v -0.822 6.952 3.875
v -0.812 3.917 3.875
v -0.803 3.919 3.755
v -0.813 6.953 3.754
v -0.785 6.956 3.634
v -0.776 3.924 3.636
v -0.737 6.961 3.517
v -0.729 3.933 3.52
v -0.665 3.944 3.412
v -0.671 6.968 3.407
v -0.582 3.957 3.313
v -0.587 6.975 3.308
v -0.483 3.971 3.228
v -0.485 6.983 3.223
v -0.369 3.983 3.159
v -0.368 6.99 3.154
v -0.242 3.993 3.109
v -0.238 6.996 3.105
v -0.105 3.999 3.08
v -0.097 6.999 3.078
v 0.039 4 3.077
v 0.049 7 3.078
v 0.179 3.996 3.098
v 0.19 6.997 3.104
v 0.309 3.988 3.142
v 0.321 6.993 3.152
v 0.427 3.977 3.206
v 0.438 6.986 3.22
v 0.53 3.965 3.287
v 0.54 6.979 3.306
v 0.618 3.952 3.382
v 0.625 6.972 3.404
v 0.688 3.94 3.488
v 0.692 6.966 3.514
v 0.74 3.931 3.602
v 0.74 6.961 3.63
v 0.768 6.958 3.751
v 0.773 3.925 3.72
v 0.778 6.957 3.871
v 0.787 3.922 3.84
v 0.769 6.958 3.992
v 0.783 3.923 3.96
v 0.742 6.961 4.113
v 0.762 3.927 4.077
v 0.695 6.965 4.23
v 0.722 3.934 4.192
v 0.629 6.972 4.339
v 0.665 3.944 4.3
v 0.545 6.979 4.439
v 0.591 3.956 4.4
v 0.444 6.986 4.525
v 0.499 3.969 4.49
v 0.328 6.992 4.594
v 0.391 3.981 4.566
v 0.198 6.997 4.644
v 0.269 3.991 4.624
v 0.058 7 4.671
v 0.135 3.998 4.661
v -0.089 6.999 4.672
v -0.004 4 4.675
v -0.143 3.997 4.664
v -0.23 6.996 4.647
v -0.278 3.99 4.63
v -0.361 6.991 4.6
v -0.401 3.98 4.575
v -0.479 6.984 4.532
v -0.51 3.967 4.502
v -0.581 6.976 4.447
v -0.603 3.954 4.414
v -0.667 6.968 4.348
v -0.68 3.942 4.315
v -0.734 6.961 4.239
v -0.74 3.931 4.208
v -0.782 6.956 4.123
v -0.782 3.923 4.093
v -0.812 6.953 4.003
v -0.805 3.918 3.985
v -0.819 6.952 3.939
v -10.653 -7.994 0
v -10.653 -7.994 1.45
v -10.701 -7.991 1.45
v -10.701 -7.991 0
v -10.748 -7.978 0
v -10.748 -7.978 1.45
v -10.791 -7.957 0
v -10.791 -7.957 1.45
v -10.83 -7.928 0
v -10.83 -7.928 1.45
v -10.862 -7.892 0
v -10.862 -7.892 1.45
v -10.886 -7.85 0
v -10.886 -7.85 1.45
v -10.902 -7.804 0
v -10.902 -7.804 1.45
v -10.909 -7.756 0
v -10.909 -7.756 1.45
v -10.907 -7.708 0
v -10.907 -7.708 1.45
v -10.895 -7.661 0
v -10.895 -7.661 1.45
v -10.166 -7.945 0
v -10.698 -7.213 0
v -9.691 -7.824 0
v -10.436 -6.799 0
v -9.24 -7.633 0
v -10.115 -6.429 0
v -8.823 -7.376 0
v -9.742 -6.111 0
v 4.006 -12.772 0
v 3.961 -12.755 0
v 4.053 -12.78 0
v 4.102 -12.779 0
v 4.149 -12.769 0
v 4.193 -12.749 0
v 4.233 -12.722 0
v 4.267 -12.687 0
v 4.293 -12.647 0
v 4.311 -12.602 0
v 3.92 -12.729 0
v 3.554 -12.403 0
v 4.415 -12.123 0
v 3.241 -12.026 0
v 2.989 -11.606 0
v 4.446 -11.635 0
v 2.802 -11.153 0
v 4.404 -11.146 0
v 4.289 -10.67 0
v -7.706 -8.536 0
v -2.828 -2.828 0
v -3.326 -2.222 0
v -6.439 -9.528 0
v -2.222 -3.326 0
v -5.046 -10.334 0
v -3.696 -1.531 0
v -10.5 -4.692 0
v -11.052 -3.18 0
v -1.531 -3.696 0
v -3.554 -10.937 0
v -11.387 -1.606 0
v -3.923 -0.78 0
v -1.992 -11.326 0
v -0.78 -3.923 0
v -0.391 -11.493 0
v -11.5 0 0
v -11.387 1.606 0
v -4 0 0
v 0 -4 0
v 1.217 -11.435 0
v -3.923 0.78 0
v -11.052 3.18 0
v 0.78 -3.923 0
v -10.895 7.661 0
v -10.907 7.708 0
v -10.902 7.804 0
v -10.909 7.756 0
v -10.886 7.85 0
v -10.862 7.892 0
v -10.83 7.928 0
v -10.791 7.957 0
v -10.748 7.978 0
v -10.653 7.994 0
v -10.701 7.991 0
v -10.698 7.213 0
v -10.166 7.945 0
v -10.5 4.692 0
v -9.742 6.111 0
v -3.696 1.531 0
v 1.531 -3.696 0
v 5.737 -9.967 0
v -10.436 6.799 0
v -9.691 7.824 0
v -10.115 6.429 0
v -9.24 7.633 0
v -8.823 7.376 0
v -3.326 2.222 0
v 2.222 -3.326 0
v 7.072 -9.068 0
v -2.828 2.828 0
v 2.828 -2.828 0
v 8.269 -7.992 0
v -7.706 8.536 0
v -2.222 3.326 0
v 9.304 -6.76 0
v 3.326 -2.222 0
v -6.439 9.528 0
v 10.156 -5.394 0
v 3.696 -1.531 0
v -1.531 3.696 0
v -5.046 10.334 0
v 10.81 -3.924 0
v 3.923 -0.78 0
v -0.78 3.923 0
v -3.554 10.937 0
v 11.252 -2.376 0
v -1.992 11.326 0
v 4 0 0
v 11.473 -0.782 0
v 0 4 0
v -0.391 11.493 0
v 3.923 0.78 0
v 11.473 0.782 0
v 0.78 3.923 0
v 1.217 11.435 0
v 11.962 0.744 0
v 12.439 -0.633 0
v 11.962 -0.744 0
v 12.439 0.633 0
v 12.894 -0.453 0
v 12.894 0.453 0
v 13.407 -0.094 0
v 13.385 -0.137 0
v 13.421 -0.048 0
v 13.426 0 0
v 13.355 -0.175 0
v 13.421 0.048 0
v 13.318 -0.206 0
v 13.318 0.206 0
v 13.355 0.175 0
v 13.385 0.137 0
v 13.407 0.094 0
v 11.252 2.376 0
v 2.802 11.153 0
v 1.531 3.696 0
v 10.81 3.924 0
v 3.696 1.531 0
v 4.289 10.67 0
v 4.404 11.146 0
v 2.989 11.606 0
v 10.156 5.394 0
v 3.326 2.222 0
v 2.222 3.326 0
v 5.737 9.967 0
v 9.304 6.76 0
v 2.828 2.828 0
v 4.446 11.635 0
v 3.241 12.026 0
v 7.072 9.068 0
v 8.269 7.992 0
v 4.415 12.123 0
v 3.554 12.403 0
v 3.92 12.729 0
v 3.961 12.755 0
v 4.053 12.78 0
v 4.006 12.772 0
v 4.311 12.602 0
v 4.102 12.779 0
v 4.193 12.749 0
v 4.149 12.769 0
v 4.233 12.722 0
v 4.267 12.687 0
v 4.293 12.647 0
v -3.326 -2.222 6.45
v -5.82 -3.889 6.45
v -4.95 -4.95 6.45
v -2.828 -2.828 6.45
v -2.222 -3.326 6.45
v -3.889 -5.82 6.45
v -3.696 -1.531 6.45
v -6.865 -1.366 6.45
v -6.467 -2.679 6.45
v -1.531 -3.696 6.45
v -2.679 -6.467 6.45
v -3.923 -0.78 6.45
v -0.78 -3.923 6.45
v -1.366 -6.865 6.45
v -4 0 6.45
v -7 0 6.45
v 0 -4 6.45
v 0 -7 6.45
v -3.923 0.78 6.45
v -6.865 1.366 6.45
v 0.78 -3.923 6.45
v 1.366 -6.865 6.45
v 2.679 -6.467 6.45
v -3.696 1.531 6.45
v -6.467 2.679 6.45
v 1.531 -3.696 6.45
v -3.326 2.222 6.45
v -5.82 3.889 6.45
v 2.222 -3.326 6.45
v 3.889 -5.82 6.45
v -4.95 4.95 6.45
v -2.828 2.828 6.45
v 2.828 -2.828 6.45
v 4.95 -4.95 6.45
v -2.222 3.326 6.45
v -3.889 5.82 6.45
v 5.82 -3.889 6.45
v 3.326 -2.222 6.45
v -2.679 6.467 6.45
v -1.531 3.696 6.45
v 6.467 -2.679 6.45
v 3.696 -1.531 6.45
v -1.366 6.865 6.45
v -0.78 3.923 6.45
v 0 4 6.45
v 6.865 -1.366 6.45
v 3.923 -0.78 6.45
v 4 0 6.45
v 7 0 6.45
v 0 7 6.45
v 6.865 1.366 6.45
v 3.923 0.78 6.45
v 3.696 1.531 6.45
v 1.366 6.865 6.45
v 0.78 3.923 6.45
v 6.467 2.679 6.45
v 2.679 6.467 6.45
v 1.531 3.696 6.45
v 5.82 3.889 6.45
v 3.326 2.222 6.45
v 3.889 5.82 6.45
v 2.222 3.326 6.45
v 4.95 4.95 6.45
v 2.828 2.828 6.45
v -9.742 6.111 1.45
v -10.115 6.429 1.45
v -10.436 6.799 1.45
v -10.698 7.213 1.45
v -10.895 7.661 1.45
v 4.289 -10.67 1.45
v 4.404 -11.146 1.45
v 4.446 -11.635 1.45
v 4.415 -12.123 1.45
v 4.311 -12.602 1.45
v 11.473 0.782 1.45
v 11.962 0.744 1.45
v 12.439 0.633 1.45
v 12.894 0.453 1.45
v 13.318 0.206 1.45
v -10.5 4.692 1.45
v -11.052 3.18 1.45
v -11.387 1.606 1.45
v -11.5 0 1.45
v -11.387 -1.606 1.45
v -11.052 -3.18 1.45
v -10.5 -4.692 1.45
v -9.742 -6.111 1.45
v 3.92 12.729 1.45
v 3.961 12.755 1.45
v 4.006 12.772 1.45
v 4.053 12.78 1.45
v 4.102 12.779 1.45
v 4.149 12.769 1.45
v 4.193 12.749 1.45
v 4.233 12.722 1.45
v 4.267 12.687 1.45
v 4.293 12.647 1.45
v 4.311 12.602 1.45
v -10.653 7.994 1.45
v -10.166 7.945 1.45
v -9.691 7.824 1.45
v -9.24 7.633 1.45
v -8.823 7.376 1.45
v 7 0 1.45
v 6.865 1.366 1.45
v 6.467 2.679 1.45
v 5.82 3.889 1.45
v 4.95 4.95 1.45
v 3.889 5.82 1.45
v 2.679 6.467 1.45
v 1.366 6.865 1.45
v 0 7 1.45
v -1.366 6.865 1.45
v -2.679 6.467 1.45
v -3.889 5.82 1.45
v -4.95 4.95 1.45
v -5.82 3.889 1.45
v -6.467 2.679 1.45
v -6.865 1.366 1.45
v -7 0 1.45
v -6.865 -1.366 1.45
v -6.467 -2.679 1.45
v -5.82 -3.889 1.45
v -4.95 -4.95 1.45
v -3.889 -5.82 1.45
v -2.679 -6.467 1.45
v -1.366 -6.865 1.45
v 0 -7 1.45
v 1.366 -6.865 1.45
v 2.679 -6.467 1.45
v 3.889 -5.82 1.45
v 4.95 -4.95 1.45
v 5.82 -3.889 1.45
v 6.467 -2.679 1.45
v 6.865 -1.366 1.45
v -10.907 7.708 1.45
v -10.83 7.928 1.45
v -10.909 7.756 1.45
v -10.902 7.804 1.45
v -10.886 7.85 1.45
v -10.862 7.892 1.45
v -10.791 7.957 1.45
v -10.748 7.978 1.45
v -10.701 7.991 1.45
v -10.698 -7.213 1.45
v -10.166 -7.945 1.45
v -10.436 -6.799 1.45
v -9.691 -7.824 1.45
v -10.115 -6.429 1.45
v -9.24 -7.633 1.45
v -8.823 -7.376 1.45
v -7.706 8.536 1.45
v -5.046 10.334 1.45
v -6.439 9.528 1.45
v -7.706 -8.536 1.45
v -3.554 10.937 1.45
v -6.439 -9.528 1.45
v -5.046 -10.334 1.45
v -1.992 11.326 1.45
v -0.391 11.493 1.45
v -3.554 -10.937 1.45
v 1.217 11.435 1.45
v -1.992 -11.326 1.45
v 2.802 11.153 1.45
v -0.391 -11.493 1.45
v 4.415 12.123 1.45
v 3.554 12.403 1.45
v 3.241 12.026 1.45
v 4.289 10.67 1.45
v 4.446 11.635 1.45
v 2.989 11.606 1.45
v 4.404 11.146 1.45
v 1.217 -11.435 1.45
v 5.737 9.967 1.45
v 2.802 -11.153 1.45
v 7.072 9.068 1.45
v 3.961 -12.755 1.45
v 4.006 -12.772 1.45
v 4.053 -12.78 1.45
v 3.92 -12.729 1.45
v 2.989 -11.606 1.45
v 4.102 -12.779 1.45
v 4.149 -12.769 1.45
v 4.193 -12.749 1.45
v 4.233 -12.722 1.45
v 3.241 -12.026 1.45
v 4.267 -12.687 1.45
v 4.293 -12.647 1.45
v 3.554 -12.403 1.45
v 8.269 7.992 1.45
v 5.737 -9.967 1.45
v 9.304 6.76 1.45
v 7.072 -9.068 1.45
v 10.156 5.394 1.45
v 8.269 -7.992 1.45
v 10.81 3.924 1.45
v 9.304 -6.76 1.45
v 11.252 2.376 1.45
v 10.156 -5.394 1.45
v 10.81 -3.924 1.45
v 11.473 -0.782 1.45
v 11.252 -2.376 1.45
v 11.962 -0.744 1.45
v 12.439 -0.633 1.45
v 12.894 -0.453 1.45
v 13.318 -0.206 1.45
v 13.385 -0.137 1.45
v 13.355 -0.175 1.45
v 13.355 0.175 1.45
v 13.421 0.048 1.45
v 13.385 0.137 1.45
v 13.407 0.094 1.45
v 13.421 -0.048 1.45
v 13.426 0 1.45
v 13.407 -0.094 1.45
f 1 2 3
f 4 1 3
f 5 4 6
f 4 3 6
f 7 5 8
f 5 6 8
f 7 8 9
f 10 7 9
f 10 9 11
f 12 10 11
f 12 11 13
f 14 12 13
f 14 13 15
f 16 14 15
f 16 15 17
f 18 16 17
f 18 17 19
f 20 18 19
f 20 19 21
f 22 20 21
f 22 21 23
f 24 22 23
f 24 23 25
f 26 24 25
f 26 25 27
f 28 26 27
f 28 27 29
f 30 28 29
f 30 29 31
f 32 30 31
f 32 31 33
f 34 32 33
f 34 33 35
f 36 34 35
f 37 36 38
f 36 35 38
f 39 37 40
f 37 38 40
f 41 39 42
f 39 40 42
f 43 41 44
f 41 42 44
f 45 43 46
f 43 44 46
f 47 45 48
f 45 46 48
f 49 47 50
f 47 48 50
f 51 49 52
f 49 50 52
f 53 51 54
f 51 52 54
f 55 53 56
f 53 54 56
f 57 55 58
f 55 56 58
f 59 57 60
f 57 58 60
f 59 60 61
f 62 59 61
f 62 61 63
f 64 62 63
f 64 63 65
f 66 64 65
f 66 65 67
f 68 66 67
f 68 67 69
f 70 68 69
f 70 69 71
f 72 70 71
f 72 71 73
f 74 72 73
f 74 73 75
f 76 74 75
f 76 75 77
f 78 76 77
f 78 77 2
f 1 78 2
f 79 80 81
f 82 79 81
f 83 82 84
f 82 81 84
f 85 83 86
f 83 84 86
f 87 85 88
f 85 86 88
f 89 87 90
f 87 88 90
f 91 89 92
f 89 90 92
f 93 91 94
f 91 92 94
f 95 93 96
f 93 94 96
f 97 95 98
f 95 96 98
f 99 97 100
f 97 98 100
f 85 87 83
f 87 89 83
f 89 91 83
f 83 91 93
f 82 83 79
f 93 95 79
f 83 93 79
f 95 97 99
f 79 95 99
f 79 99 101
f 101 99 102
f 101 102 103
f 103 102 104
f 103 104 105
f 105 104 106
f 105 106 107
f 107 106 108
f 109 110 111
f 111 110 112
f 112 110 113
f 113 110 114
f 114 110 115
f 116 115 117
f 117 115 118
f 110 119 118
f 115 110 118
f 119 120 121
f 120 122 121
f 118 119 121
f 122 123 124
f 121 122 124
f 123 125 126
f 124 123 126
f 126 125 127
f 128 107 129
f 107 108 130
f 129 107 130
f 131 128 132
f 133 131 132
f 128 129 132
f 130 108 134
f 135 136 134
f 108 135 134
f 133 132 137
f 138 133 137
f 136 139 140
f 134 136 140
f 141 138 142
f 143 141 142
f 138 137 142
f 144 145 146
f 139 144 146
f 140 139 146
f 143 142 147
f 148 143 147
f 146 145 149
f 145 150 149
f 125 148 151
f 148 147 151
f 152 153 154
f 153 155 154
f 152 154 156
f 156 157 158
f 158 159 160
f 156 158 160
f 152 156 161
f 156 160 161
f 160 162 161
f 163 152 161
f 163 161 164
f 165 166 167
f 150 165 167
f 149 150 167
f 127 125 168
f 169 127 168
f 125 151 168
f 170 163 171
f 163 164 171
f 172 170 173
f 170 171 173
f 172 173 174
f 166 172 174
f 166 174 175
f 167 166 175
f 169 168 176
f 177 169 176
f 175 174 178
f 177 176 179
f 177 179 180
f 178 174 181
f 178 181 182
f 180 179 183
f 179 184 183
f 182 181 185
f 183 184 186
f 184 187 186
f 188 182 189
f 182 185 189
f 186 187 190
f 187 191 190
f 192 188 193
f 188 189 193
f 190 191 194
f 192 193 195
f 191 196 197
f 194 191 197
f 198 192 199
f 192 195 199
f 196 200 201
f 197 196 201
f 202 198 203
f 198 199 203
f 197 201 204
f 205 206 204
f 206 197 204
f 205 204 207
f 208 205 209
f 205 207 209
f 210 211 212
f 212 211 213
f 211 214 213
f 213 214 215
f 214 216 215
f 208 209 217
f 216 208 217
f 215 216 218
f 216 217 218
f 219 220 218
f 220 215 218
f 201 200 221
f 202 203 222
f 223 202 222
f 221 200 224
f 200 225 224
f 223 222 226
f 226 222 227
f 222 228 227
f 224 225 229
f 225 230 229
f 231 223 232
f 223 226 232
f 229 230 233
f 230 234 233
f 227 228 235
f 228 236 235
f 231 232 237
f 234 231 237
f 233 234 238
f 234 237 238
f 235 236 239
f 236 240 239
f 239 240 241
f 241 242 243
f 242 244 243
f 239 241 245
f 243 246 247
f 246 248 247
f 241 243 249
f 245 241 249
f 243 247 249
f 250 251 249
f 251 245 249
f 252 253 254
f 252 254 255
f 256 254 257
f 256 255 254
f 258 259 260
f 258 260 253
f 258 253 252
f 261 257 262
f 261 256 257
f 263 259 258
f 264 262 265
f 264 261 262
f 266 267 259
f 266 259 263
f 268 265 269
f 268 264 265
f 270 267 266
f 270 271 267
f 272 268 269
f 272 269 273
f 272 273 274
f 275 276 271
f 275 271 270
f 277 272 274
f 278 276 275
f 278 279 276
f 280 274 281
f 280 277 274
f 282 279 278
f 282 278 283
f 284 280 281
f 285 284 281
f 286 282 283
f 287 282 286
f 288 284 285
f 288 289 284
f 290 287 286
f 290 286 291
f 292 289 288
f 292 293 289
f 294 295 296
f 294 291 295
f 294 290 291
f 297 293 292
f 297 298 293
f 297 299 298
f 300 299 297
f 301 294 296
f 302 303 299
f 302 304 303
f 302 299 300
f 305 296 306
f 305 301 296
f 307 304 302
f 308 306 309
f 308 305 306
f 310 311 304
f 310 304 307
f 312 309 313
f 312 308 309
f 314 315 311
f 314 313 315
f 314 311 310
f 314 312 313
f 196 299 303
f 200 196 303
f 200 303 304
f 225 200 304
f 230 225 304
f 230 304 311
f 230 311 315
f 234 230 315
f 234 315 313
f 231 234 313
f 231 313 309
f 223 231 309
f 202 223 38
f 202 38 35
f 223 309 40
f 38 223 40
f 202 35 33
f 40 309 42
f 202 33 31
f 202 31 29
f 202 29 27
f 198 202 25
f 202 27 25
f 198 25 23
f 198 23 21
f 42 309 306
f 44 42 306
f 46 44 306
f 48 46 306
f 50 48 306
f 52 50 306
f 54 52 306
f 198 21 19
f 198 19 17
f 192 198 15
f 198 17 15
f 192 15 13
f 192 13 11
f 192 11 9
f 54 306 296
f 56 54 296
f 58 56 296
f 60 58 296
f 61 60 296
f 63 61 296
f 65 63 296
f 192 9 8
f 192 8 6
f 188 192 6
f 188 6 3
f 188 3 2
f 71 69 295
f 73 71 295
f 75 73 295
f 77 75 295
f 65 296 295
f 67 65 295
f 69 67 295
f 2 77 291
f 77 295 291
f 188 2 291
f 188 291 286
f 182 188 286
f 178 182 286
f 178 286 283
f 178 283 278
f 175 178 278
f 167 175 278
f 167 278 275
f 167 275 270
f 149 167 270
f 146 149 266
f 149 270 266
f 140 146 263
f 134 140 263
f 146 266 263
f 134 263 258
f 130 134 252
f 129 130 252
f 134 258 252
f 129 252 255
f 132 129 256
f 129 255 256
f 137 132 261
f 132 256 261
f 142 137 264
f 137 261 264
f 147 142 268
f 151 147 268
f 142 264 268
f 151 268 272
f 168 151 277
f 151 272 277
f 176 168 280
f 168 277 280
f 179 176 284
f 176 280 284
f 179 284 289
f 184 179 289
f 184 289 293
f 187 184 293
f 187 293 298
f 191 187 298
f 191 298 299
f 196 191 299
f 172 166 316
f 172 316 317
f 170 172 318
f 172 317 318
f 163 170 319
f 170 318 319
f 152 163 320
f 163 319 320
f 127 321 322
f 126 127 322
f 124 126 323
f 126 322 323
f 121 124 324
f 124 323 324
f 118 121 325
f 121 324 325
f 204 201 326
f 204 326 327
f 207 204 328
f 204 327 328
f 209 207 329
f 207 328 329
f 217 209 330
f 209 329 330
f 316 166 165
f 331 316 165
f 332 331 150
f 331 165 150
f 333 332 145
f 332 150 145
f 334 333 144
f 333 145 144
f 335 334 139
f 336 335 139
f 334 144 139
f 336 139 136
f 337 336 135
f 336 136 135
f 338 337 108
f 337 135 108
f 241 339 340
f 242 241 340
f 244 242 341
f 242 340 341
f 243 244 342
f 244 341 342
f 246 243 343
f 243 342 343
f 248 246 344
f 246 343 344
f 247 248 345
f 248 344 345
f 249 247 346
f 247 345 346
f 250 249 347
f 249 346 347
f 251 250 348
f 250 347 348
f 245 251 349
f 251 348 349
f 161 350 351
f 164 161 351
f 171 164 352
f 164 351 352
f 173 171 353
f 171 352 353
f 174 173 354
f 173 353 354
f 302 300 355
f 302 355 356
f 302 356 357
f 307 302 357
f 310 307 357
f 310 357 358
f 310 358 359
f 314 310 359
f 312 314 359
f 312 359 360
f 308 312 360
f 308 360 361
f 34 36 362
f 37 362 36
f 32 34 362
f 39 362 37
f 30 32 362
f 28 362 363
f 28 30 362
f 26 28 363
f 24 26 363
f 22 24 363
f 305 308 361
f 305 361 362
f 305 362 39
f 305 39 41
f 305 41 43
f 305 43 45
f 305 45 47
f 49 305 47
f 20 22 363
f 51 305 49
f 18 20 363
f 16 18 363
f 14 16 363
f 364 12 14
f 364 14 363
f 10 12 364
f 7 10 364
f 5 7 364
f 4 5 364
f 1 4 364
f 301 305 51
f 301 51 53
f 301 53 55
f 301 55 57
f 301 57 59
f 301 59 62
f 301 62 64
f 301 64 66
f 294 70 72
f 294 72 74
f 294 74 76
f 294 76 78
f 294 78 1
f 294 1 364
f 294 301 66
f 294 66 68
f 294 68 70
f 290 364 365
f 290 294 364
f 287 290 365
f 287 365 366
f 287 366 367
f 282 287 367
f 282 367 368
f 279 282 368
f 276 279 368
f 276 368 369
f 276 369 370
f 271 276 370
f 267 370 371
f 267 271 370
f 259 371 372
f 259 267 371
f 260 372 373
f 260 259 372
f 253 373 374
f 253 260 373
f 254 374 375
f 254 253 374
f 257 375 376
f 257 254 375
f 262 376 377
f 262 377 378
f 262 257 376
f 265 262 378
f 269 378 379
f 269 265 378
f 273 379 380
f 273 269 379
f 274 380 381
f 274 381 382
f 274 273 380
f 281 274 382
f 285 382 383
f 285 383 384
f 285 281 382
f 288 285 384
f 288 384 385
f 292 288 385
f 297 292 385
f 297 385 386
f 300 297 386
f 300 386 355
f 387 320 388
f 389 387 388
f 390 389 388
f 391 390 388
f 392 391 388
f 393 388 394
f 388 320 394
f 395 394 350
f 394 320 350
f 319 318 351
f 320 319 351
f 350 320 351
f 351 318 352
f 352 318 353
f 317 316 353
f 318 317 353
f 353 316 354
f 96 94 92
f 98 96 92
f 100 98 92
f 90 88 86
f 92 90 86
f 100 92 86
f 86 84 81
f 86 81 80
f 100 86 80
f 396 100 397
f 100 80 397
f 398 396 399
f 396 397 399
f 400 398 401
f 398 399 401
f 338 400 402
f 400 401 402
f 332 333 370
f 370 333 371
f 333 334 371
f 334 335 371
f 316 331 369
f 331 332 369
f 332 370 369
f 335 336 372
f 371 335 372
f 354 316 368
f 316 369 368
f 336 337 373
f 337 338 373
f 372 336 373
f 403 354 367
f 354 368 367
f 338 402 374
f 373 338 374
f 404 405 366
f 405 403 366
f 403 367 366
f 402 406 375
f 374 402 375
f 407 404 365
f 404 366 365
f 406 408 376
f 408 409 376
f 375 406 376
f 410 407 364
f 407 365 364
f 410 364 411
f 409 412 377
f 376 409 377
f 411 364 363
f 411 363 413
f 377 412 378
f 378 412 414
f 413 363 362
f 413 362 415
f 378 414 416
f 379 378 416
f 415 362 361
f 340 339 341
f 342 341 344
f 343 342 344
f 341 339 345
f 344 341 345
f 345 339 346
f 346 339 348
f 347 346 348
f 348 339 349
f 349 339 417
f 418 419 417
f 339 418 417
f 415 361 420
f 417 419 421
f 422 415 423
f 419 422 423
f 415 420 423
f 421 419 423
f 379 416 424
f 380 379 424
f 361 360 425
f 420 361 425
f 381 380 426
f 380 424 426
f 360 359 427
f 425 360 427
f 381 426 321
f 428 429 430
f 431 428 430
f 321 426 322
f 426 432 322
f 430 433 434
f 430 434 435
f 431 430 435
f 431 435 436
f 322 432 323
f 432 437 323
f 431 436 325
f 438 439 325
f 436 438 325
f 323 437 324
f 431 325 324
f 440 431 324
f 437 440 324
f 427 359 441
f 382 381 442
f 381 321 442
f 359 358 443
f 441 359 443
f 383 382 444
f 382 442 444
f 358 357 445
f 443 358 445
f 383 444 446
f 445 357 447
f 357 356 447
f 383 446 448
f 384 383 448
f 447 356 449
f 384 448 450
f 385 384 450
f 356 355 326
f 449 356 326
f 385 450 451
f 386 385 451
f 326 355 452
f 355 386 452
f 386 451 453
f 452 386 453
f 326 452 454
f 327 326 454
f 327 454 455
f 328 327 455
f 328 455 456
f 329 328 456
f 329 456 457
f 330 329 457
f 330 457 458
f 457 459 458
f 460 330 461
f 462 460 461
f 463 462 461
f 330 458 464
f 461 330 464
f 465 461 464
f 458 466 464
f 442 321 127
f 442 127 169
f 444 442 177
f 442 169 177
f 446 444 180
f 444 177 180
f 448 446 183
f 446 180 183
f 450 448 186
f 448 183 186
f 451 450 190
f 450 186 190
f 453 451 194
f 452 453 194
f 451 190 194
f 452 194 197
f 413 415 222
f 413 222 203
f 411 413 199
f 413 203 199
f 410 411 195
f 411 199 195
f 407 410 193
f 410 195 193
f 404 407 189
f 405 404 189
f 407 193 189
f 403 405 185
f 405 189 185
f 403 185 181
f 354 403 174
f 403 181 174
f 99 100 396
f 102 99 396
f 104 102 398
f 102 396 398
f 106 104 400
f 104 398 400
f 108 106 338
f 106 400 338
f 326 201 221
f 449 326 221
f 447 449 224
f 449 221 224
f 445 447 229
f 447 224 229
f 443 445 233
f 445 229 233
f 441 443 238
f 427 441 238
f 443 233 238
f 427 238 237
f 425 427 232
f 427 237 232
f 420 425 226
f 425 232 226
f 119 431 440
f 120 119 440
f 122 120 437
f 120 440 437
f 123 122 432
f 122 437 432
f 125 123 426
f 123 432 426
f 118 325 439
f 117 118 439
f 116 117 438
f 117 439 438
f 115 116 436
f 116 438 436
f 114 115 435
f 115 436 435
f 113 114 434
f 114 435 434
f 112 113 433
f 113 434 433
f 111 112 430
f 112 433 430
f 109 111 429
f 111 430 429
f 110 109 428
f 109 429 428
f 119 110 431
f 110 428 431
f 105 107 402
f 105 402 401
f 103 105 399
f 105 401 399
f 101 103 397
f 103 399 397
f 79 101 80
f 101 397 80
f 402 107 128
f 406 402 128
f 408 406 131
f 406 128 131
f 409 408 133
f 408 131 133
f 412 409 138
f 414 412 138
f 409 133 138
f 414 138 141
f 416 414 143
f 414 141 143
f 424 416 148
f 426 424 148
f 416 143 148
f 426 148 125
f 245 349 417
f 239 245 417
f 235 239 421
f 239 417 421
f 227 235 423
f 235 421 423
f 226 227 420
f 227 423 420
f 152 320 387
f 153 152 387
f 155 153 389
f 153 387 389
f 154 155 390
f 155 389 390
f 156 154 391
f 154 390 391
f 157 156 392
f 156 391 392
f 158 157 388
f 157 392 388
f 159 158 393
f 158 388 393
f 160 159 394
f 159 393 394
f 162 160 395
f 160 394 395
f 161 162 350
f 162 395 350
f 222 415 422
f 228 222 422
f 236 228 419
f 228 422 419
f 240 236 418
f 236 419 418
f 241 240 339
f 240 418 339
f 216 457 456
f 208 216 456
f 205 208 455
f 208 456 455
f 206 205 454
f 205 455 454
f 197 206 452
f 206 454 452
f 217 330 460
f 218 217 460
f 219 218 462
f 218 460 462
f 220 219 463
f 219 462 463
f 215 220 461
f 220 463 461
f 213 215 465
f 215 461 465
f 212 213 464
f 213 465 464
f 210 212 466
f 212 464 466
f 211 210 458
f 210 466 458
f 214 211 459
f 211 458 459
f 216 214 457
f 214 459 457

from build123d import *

# Parameters (mm, degrees)
SKETCH1_R                 = 11.5
BOSS_EXTRUDE1_DEPTH       = 1.45
BOSS_EXTRUDE2_DEPTH       = 1.45
CIRPATTERN2_COUNT         = 5
SKETCH4_R                 = 4
CUT_EXTRUDE1_DEPTH        = 1.45
BOSS_EXTRUDE3_START       = 5
SKETCH5_R                 = 7
SKETCH5_R_2               = 4
BOSS_EXTRUDE3_DEPTH       = 5
M2X0_4_TAPPED_HOLE3_D     = 1.6
M2X0_4_TAPPED_HOLE3_DEPTH = 5.2
M2X0_4_TAPPED_HOLE3_TIP   = 0.480688495


with BuildPart() as part:
    # Sketch1 → Boss-Extrude1 (new body)
    with BuildSketch(Plane.XY):
        Circle(SKETCH1_R)
    extrude(amount=BOSS_EXTRUDE1_DEPTH)

    # Sketch2 → Boss-Extrude2 (add)
    with BuildSketch(Plane.XY.offset(1.45)):
        with BuildLine():
            Line((11.466388324, -0.781762992), (11.466388324, 0.781762992))
            ThreePointArc((11.466388324, 0.781762992), (12.435767446, 0.634469665), (13.317644229, 0.205885315))
            ThreePointArc((13.317644229, 0.205885315), (13.425830137, 0), (13.317644229, -0.205885315))
            ThreePointArc((13.317644229, -0.205885315), (12.435767446, -0.634469665), (11.466388324, -0.781762992))
        make_face()
    boss_extrude2 = extrude(amount=-BOSS_EXTRUDE2_DEPTH)

    # CirPattern2: Boss-Extrude2 ×5 about axis
    cirpattern2_axis = Axis((0, 0, 0), (0, 0, 1))
    for i in range(1, CIRPATTERN2_COUNT):
        add(boss_extrude2.rotate(cirpattern2_axis, i * 360 / CIRPATTERN2_COUNT))

    # Sketch4 → Cut-Extrude1 (cut)
    with BuildSketch(Plane.XY.offset(1.45)):
        Circle(SKETCH4_R)
    extrude(amount=-CUT_EXTRUDE1_DEPTH, mode=Mode.SUBTRACT)

    # Sketch5 → Boss-Extrude3 (add)
    with BuildSketch(Plane.XY.offset(1.45).offset(BOSS_EXTRUDE3_START)):
        Circle(SKETCH5_R)
        Circle(SKETCH5_R_2, mode=Mode.SUBTRACT)
    extrude(amount=-BOSS_EXTRUDE3_DEPTH)

    # M2x0.4 Tapped Hole3
    with Locations(Plane(origin=(-0.021974878, 6.999965507, 3.87491846), x_dir=(0.999995072485, 0.003139268242, 0), z_dir=(-0.003139268242, 0.999995072485, 0))):
        with Locations((0, 0)):
            Hole(M2X0_4_TAPPED_HOLE3_D / 2, depth=M2X0_4_TAPPED_HOLE3_DEPTH)
            with Locations((0, 0, -(M2X0_4_TAPPED_HOLE3_DEPTH + M2X0_4_TAPPED_HOLE3_TIP / 2))):  # 118° drill point
                Cone(0, M2X0_4_TAPPED_HOLE3_D / 2, M2X0_4_TAPPED_HOLE3_TIP, mode=Mode.SUBTRACT)


solid = part.part
